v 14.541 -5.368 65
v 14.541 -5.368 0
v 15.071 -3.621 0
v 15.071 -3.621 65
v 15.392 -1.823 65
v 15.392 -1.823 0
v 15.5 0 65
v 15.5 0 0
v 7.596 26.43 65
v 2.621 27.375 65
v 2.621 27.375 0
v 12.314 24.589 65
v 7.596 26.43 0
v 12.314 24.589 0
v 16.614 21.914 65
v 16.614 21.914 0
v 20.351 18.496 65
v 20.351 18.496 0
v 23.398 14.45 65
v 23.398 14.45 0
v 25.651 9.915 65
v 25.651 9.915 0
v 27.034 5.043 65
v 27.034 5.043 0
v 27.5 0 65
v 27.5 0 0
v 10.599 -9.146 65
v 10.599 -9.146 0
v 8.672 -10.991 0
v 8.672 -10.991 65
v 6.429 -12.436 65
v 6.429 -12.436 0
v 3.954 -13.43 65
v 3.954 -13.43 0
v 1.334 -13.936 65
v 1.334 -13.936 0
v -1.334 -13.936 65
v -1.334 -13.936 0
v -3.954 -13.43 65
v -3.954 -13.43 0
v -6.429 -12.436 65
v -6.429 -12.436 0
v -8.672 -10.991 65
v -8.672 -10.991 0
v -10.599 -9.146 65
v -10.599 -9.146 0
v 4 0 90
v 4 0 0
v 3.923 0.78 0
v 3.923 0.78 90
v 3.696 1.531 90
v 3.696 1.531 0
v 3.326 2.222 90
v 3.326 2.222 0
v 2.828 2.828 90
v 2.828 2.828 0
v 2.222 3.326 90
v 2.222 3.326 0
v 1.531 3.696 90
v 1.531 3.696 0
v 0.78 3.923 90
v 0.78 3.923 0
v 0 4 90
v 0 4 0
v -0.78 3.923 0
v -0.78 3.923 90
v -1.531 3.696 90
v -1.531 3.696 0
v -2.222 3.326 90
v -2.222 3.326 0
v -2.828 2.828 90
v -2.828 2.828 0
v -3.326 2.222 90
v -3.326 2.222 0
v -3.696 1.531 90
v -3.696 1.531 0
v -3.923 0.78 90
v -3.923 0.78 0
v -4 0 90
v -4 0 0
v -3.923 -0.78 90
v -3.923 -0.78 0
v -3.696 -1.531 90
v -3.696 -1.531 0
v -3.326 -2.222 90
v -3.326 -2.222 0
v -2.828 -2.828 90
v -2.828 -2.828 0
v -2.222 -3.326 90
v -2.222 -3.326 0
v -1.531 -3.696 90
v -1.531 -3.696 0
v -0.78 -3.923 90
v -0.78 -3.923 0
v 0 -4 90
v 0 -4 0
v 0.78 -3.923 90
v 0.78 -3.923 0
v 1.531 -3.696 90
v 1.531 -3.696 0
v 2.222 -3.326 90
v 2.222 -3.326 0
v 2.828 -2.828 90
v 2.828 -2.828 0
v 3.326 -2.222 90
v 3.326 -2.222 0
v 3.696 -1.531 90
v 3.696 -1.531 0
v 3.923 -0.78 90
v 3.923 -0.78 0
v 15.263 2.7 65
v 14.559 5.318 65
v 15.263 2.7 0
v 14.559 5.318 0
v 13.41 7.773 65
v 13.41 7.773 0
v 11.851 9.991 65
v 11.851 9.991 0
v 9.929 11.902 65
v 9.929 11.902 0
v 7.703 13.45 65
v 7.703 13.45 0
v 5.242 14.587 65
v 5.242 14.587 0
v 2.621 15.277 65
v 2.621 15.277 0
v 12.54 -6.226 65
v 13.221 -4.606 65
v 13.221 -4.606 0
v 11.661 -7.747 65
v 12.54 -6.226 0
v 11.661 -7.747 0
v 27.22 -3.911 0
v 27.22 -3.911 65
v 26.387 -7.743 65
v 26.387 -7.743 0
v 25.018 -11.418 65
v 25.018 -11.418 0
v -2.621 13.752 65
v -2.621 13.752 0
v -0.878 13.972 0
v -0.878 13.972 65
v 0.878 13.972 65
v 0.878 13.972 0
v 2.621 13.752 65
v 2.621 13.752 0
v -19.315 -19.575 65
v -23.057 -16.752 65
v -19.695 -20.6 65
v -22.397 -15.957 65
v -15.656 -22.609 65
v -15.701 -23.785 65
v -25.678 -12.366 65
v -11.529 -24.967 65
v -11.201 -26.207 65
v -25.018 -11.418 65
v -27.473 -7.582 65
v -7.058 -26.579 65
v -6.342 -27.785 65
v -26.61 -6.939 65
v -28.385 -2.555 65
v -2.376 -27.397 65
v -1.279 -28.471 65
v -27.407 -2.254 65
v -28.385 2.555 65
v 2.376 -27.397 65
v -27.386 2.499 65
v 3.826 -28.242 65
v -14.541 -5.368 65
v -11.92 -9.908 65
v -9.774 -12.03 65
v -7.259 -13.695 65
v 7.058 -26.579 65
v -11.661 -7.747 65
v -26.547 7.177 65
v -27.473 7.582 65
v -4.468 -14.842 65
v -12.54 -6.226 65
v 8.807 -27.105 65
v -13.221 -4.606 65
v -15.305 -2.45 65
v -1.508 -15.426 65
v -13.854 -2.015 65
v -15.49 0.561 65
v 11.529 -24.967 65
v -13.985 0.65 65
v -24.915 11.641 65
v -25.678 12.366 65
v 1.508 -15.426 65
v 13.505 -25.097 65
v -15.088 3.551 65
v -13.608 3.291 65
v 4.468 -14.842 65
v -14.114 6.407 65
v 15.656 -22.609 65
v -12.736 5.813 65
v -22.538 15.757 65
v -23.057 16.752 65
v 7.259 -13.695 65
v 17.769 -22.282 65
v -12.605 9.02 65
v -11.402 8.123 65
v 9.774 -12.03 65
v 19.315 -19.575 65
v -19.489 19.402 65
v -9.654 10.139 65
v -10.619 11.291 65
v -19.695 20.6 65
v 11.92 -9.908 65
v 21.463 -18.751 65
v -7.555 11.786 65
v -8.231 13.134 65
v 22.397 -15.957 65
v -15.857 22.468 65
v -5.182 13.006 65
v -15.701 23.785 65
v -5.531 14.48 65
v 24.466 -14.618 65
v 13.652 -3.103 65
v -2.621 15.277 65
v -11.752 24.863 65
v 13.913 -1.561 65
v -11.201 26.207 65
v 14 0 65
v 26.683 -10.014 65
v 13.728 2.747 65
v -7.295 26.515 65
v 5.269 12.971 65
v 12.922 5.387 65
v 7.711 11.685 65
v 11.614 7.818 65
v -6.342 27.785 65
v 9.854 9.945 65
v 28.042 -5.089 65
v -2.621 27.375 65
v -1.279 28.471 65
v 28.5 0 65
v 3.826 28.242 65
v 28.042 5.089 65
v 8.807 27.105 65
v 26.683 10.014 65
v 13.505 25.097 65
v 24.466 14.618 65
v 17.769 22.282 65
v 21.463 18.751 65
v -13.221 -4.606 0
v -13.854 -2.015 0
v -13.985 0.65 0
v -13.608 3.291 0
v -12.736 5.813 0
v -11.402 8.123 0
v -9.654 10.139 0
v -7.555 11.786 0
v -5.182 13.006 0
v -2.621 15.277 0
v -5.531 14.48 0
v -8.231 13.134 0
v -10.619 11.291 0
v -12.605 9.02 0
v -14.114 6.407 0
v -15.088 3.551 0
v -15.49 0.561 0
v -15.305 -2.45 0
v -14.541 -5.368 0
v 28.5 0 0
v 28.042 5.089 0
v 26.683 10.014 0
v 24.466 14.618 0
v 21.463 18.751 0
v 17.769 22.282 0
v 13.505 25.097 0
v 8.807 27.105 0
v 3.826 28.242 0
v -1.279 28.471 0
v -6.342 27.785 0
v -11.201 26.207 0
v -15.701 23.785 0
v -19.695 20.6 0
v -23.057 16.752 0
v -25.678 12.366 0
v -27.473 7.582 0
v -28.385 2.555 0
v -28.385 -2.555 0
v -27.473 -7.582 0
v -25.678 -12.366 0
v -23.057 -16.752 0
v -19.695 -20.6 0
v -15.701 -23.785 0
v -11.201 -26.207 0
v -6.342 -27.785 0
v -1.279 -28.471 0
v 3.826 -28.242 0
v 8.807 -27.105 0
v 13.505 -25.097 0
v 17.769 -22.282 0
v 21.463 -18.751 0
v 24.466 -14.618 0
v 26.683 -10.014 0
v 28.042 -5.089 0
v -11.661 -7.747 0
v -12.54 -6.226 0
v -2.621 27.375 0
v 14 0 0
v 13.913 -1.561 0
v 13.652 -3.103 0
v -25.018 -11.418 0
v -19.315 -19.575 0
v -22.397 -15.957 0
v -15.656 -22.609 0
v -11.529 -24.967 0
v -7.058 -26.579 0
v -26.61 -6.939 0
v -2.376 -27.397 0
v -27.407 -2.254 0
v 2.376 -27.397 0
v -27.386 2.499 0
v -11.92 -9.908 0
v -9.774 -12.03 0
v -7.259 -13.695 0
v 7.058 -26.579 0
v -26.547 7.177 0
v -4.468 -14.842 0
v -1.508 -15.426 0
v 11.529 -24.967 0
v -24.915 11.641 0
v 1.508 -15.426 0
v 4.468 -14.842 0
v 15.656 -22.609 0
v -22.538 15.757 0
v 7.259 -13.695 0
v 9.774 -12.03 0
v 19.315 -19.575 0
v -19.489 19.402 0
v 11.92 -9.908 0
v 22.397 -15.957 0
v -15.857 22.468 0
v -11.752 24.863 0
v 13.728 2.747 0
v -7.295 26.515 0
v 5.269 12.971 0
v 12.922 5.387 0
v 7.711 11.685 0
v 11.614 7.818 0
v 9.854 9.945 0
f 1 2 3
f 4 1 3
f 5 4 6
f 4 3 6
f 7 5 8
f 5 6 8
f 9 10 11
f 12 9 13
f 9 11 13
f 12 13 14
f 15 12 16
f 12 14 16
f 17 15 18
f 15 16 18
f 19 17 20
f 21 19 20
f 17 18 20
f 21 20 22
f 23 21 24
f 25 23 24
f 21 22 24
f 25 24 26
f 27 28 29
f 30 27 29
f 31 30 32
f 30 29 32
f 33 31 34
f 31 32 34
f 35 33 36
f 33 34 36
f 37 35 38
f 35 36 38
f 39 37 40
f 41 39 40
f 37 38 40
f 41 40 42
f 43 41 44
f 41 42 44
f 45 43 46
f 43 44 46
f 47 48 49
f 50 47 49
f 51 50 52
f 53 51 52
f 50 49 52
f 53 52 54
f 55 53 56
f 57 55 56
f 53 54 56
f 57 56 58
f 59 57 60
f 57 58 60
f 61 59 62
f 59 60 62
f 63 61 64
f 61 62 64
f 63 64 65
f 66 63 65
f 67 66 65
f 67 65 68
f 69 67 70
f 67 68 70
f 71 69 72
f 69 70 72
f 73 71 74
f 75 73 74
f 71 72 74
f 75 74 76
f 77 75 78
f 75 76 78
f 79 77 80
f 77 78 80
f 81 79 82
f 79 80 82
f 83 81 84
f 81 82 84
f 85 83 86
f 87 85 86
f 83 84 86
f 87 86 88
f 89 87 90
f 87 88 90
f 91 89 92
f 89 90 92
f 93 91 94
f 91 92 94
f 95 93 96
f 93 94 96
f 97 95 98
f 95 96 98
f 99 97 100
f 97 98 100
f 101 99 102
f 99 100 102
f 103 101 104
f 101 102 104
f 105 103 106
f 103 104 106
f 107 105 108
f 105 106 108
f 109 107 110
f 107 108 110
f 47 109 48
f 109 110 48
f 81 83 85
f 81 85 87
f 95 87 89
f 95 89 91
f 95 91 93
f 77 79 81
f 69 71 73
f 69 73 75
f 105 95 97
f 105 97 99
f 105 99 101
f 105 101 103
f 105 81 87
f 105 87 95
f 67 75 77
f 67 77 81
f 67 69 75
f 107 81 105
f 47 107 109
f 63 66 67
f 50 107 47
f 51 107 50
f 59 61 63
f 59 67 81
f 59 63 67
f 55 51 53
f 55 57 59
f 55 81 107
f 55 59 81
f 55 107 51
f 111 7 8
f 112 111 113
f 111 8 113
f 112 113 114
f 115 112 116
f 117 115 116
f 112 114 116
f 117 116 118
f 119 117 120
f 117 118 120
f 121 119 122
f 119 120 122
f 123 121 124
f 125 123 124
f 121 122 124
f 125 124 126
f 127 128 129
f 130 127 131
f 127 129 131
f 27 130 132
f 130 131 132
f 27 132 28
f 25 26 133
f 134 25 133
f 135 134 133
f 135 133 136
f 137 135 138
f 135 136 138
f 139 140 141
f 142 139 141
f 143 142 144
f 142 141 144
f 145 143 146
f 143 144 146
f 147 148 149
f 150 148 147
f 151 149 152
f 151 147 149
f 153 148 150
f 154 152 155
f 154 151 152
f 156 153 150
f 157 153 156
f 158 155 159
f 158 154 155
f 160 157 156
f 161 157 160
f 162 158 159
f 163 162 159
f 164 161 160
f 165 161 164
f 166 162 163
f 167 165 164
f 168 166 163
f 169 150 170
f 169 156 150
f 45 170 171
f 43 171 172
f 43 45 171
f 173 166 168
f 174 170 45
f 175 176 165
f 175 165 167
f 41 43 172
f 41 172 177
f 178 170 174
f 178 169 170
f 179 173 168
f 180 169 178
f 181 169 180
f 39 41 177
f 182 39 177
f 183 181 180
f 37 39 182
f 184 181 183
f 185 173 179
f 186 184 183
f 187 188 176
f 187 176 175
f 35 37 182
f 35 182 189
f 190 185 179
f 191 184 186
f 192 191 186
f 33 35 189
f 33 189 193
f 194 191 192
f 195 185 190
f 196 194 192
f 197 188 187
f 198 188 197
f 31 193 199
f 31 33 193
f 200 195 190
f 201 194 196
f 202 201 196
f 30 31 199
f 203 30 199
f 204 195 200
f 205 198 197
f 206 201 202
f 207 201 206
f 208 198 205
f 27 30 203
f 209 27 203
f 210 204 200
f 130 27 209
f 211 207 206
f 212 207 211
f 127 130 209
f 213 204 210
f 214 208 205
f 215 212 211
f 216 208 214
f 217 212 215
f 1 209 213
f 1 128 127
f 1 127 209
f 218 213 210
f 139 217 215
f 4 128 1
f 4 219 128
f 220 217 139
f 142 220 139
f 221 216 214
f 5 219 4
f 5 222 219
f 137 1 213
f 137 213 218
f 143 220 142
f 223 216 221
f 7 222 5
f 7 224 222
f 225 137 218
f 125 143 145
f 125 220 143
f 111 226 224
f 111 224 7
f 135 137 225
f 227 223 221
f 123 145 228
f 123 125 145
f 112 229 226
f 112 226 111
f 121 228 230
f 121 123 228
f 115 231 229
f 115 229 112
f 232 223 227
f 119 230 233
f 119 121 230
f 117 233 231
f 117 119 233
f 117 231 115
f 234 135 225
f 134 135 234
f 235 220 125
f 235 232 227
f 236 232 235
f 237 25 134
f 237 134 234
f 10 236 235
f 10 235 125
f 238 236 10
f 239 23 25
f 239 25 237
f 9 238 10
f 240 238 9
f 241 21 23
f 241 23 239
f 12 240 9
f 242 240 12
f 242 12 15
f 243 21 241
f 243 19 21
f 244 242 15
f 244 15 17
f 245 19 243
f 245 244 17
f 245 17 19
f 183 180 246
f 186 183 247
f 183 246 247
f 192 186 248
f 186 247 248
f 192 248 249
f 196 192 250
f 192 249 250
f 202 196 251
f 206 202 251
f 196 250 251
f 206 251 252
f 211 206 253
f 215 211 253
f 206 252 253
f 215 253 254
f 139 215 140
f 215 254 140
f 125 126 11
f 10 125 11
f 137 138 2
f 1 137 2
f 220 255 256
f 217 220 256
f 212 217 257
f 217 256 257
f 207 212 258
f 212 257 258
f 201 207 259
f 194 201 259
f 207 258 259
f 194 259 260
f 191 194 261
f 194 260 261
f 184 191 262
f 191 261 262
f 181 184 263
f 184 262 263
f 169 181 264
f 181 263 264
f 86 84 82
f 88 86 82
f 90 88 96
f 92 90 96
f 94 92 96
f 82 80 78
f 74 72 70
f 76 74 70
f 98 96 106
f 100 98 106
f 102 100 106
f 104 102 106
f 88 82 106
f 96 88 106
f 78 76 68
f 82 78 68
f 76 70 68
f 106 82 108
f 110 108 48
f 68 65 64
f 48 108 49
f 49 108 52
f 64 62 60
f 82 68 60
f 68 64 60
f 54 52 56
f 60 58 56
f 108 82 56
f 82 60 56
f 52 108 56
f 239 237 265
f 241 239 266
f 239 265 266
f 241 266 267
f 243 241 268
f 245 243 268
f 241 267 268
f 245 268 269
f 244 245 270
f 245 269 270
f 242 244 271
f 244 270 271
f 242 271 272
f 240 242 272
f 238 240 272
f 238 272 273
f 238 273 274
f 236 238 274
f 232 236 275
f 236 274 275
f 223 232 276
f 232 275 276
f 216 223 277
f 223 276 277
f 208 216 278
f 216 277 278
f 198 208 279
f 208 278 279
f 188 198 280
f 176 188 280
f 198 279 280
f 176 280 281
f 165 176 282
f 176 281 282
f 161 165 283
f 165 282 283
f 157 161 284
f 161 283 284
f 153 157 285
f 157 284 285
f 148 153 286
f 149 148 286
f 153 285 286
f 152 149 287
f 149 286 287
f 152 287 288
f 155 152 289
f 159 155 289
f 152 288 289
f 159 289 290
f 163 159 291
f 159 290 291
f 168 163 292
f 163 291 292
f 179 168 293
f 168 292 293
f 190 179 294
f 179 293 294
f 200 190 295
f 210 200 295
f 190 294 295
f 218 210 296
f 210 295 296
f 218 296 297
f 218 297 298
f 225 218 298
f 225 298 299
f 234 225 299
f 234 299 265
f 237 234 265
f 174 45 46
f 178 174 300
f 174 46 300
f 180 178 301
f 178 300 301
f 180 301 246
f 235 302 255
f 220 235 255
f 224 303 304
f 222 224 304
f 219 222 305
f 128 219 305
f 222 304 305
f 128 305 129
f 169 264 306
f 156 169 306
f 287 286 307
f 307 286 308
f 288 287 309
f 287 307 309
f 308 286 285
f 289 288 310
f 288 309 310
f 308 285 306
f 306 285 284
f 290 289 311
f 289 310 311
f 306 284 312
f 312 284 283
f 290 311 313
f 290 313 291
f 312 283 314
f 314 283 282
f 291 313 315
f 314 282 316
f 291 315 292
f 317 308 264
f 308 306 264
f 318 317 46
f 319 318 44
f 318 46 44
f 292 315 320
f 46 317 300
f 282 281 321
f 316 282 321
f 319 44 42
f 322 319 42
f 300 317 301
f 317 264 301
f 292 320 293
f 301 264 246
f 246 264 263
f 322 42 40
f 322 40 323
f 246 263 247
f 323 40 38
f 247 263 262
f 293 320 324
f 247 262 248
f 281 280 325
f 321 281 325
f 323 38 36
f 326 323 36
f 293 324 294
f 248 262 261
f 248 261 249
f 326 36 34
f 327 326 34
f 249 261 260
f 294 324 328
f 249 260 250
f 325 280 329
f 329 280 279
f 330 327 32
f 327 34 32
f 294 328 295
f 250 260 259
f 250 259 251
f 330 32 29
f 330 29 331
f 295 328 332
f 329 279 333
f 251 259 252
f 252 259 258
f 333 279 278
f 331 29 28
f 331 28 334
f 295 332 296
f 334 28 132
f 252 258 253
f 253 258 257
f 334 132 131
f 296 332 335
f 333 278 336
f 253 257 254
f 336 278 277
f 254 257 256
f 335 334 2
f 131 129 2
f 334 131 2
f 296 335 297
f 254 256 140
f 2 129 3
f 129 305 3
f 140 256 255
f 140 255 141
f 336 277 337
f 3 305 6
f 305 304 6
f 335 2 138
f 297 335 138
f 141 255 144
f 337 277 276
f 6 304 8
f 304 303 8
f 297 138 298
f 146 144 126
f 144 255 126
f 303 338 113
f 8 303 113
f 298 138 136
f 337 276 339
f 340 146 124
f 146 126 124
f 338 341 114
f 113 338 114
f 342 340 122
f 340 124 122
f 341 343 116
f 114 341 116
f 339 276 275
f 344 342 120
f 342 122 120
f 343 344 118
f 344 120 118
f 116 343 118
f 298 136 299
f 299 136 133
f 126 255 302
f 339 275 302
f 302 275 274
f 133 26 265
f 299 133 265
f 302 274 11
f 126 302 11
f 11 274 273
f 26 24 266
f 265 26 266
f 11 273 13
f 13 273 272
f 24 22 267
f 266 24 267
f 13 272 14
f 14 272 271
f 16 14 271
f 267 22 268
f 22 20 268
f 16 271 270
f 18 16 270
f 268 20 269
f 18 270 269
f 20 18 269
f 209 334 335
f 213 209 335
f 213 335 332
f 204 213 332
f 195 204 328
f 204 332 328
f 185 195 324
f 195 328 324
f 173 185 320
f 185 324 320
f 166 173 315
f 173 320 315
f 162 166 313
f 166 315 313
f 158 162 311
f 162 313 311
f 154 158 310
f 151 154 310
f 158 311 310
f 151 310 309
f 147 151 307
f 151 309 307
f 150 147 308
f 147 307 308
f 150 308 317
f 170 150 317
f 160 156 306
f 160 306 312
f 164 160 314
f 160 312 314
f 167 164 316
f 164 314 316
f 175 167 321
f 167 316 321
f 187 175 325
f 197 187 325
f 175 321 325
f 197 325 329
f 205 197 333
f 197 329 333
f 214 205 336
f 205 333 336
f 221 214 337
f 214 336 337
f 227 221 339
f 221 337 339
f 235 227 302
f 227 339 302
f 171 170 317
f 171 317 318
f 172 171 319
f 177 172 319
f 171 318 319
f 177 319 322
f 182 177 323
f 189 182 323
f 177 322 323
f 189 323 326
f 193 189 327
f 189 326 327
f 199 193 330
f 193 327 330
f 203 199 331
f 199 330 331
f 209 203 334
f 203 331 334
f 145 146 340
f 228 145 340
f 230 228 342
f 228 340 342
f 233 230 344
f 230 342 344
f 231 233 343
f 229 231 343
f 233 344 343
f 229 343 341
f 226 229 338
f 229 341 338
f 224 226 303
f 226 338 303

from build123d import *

# Parameters (mm, degrees)
F0_R     = 28.5
F1_DEPTH = 65
F0_R_2   = 4
F2_DEPTH = 90


with BuildPart() as f1:
    # F0 (on Top) → F1 (new body)
    with BuildSketch(Plane.XY):
        Circle(F0_R)
        with BuildLine():
            ThreePointArc((2.6210568156, 27.3748070526), (20.3510326818, 18.4955526759), (27.5, 0))
            ThreePointArc((27.5, 0), (26.8722876336, -5.8421021334), (25.0178067391, -11.4175017392))
            ThreePointArc((25.0178067391, -11.4175017392), (23.8156986041, -13.75), (22.3967499235, -15.9573053134))
            ThreePointArc((22.3967499235, -15.9573053134), (0, -27.5), (-22.3967499235, -15.9573053134))
            ThreePointArc((-22.3967499235, -15.9573053134), (-23.8156986041, -13.75), (-25.0178067391, -11.4175017392))
            ThreePointArc((-25.0178067391, -11.4175017392), (-23.8156986041, 13.75), (-2.6210568156, 27.3748070526))
            ThreePointArc((-2.6210568156, 27.3748070526), (0, 27.5), (2.6210568156, 27.3748070526))
        make_face(mode=Mode.SUBTRACT)
        with BuildLine():
            Line((2.6210568156, 15.2767817674), (2.6210568156, 27.3748070526))
            ThreePointArc((2.6210568156, 27.3748070526), (0, 27.5), (-2.6210568156, 27.3748070526))
            Line((-2.6210568156, 27.3748070526), (-2.6210568156, 15.2767817674))
            ThreePointArc((-2.6210568156, 15.2767817674), (0, 15.5), (2.6210568156, 15.2767817674))
        make_face()
        with BuildLine():
            Line((-14.5406095065, -5.3684890966), (-25.0178067391, -11.4175017392))
            ThreePointArc((-25.0178067391, -11.4175017392), (-23.8156986041, -13.75), (-22.3967499235, -15.9573053134))
            Line((-22.3967499235, -15.9573053134), (-11.9195526908, -9.9082926708))
            ThreePointArc((-11.9195526908, -9.9082926708), (-13.4233937587, -7.75), (-14.5406095065, -5.3684890966))
        make_face()
        with BuildLine():
            ThreePointArc((22.3967499235, -15.9573053134), (23.8156986041, -13.75), (25.0178067391, -11.4175017392))
            Line((25.0178067391, -11.4175017392), (14.5406095065, -5.3684890966))
            ThreePointArc((14.5406095065, -5.3684890966), (13.4233937587, -7.75), (11.9195526908, -9.9082926708))
            Line((11.9195526908, -9.9082926708), (22.3967499235, -15.9573053134))
        make_face()
        with BuildLine():
            Line((-2.6210568156, 13.7524565504), (-2.6210568156, 15.2767817674))
            ThreePointArc((-2.6210568156, 15.2767817674), (-13.4233937587, 7.75), (-14.5406095065, -5.3684890966))
            Line((-14.5406095065, -5.3684890966), (-13.2205051449, -4.6063264881))
            ThreePointArc((-13.2205051449, -4.6063264881), (-12.124355653, 7), (-2.6210568156, 13.7524565504))
        make_face()
        with BuildLine():
            ThreePointArc((15.5, 0), (11.8506620204, 9.9905860528), (2.6210568156, 15.2767817674))
            Line((2.6210568156, 15.2767817674), (2.6210568156, 13.7524565504))
            ThreePointArc((2.6210568156, 13.7524565504), (10.7864450914, 8.9248306589), (14, 0))
            ThreePointArc((14, 0), (13.8037507951, -2.3359075294), (13.2205051449, -4.6063264881))
            Line((13.2205051449, -4.6063264881), (14.5406095065, -5.3684890966))
            ThreePointArc((14.5406095065, -5.3684890966), (15.2582673877, -2.7267703103), (15.5, 0))
        make_face()
        with BuildLine():
            ThreePointArc((-11.9195526908, -9.9082926708), (0, -15.5), (11.9195526908, -9.9082926708))
            Line((11.9195526908, -9.9082926708), (10.5994483292, -9.1461300623))
            ThreePointArc((10.5994483292, -9.1461300623), (0, -14), (-10.5994483292, -9.1461300623))
            Line((-10.5994483292, -9.1461300623), (-11.9195526908, -9.9082926708))
        make_face()
        with BuildLine():
            Line((2.6210568156, 13.7524565504), (2.6210568156, 15.2767817674))
            ThreePointArc((2.6210568156, 15.2767817674), (0, 15.5), (-2.6210568156, 15.2767817674))
            Line((-2.6210568156, 15.2767817674), (-2.6210568156, 13.7524565504))
            ThreePointArc((-2.6210568156, 13.7524565504), (0, 14), (2.6210568156, 13.7524565504))
        make_face()
        with BuildLine():
            Line((-13.2205051449, -4.6063264881), (-14.5406095065, -5.3684890966))
            ThreePointArc((-14.5406095065, -5.3684890966), (-13.4233937587, -7.75), (-11.9195526908, -9.9082926708))
            Line((-11.9195526908, -9.9082926708), (-10.5994483292, -9.1461300623))
            ThreePointArc((-10.5994483292, -9.1461300623), (-12.124355653, -7), (-13.2205051449, -4.6063264881))
        make_face()
        with BuildLine():
            ThreePointArc((11.9195526908, -9.9082926708), (13.4233937587, -7.75), (14.5406095065, -5.3684890966))
            Line((14.5406095065, -5.3684890966), (13.2205051449, -4.6063264881))
            ThreePointArc((13.2205051449, -4.6063264881), (12.124355653, -7), (10.5994483292, -9.1461300623))
            Line((10.5994483292, -9.1461300623), (11.9195526908, -9.9082926708))
        make_face()
    extrude(amount=F1_DEPTH)


with BuildPart() as f2:
    # F0 (on Top) → F2 (new body)
    with BuildSketch(Plane.XY):
        Circle(F0_R_2)
    extrude(amount=F2_DEPTH)


solid = Compound([f1.part, f2.part])
